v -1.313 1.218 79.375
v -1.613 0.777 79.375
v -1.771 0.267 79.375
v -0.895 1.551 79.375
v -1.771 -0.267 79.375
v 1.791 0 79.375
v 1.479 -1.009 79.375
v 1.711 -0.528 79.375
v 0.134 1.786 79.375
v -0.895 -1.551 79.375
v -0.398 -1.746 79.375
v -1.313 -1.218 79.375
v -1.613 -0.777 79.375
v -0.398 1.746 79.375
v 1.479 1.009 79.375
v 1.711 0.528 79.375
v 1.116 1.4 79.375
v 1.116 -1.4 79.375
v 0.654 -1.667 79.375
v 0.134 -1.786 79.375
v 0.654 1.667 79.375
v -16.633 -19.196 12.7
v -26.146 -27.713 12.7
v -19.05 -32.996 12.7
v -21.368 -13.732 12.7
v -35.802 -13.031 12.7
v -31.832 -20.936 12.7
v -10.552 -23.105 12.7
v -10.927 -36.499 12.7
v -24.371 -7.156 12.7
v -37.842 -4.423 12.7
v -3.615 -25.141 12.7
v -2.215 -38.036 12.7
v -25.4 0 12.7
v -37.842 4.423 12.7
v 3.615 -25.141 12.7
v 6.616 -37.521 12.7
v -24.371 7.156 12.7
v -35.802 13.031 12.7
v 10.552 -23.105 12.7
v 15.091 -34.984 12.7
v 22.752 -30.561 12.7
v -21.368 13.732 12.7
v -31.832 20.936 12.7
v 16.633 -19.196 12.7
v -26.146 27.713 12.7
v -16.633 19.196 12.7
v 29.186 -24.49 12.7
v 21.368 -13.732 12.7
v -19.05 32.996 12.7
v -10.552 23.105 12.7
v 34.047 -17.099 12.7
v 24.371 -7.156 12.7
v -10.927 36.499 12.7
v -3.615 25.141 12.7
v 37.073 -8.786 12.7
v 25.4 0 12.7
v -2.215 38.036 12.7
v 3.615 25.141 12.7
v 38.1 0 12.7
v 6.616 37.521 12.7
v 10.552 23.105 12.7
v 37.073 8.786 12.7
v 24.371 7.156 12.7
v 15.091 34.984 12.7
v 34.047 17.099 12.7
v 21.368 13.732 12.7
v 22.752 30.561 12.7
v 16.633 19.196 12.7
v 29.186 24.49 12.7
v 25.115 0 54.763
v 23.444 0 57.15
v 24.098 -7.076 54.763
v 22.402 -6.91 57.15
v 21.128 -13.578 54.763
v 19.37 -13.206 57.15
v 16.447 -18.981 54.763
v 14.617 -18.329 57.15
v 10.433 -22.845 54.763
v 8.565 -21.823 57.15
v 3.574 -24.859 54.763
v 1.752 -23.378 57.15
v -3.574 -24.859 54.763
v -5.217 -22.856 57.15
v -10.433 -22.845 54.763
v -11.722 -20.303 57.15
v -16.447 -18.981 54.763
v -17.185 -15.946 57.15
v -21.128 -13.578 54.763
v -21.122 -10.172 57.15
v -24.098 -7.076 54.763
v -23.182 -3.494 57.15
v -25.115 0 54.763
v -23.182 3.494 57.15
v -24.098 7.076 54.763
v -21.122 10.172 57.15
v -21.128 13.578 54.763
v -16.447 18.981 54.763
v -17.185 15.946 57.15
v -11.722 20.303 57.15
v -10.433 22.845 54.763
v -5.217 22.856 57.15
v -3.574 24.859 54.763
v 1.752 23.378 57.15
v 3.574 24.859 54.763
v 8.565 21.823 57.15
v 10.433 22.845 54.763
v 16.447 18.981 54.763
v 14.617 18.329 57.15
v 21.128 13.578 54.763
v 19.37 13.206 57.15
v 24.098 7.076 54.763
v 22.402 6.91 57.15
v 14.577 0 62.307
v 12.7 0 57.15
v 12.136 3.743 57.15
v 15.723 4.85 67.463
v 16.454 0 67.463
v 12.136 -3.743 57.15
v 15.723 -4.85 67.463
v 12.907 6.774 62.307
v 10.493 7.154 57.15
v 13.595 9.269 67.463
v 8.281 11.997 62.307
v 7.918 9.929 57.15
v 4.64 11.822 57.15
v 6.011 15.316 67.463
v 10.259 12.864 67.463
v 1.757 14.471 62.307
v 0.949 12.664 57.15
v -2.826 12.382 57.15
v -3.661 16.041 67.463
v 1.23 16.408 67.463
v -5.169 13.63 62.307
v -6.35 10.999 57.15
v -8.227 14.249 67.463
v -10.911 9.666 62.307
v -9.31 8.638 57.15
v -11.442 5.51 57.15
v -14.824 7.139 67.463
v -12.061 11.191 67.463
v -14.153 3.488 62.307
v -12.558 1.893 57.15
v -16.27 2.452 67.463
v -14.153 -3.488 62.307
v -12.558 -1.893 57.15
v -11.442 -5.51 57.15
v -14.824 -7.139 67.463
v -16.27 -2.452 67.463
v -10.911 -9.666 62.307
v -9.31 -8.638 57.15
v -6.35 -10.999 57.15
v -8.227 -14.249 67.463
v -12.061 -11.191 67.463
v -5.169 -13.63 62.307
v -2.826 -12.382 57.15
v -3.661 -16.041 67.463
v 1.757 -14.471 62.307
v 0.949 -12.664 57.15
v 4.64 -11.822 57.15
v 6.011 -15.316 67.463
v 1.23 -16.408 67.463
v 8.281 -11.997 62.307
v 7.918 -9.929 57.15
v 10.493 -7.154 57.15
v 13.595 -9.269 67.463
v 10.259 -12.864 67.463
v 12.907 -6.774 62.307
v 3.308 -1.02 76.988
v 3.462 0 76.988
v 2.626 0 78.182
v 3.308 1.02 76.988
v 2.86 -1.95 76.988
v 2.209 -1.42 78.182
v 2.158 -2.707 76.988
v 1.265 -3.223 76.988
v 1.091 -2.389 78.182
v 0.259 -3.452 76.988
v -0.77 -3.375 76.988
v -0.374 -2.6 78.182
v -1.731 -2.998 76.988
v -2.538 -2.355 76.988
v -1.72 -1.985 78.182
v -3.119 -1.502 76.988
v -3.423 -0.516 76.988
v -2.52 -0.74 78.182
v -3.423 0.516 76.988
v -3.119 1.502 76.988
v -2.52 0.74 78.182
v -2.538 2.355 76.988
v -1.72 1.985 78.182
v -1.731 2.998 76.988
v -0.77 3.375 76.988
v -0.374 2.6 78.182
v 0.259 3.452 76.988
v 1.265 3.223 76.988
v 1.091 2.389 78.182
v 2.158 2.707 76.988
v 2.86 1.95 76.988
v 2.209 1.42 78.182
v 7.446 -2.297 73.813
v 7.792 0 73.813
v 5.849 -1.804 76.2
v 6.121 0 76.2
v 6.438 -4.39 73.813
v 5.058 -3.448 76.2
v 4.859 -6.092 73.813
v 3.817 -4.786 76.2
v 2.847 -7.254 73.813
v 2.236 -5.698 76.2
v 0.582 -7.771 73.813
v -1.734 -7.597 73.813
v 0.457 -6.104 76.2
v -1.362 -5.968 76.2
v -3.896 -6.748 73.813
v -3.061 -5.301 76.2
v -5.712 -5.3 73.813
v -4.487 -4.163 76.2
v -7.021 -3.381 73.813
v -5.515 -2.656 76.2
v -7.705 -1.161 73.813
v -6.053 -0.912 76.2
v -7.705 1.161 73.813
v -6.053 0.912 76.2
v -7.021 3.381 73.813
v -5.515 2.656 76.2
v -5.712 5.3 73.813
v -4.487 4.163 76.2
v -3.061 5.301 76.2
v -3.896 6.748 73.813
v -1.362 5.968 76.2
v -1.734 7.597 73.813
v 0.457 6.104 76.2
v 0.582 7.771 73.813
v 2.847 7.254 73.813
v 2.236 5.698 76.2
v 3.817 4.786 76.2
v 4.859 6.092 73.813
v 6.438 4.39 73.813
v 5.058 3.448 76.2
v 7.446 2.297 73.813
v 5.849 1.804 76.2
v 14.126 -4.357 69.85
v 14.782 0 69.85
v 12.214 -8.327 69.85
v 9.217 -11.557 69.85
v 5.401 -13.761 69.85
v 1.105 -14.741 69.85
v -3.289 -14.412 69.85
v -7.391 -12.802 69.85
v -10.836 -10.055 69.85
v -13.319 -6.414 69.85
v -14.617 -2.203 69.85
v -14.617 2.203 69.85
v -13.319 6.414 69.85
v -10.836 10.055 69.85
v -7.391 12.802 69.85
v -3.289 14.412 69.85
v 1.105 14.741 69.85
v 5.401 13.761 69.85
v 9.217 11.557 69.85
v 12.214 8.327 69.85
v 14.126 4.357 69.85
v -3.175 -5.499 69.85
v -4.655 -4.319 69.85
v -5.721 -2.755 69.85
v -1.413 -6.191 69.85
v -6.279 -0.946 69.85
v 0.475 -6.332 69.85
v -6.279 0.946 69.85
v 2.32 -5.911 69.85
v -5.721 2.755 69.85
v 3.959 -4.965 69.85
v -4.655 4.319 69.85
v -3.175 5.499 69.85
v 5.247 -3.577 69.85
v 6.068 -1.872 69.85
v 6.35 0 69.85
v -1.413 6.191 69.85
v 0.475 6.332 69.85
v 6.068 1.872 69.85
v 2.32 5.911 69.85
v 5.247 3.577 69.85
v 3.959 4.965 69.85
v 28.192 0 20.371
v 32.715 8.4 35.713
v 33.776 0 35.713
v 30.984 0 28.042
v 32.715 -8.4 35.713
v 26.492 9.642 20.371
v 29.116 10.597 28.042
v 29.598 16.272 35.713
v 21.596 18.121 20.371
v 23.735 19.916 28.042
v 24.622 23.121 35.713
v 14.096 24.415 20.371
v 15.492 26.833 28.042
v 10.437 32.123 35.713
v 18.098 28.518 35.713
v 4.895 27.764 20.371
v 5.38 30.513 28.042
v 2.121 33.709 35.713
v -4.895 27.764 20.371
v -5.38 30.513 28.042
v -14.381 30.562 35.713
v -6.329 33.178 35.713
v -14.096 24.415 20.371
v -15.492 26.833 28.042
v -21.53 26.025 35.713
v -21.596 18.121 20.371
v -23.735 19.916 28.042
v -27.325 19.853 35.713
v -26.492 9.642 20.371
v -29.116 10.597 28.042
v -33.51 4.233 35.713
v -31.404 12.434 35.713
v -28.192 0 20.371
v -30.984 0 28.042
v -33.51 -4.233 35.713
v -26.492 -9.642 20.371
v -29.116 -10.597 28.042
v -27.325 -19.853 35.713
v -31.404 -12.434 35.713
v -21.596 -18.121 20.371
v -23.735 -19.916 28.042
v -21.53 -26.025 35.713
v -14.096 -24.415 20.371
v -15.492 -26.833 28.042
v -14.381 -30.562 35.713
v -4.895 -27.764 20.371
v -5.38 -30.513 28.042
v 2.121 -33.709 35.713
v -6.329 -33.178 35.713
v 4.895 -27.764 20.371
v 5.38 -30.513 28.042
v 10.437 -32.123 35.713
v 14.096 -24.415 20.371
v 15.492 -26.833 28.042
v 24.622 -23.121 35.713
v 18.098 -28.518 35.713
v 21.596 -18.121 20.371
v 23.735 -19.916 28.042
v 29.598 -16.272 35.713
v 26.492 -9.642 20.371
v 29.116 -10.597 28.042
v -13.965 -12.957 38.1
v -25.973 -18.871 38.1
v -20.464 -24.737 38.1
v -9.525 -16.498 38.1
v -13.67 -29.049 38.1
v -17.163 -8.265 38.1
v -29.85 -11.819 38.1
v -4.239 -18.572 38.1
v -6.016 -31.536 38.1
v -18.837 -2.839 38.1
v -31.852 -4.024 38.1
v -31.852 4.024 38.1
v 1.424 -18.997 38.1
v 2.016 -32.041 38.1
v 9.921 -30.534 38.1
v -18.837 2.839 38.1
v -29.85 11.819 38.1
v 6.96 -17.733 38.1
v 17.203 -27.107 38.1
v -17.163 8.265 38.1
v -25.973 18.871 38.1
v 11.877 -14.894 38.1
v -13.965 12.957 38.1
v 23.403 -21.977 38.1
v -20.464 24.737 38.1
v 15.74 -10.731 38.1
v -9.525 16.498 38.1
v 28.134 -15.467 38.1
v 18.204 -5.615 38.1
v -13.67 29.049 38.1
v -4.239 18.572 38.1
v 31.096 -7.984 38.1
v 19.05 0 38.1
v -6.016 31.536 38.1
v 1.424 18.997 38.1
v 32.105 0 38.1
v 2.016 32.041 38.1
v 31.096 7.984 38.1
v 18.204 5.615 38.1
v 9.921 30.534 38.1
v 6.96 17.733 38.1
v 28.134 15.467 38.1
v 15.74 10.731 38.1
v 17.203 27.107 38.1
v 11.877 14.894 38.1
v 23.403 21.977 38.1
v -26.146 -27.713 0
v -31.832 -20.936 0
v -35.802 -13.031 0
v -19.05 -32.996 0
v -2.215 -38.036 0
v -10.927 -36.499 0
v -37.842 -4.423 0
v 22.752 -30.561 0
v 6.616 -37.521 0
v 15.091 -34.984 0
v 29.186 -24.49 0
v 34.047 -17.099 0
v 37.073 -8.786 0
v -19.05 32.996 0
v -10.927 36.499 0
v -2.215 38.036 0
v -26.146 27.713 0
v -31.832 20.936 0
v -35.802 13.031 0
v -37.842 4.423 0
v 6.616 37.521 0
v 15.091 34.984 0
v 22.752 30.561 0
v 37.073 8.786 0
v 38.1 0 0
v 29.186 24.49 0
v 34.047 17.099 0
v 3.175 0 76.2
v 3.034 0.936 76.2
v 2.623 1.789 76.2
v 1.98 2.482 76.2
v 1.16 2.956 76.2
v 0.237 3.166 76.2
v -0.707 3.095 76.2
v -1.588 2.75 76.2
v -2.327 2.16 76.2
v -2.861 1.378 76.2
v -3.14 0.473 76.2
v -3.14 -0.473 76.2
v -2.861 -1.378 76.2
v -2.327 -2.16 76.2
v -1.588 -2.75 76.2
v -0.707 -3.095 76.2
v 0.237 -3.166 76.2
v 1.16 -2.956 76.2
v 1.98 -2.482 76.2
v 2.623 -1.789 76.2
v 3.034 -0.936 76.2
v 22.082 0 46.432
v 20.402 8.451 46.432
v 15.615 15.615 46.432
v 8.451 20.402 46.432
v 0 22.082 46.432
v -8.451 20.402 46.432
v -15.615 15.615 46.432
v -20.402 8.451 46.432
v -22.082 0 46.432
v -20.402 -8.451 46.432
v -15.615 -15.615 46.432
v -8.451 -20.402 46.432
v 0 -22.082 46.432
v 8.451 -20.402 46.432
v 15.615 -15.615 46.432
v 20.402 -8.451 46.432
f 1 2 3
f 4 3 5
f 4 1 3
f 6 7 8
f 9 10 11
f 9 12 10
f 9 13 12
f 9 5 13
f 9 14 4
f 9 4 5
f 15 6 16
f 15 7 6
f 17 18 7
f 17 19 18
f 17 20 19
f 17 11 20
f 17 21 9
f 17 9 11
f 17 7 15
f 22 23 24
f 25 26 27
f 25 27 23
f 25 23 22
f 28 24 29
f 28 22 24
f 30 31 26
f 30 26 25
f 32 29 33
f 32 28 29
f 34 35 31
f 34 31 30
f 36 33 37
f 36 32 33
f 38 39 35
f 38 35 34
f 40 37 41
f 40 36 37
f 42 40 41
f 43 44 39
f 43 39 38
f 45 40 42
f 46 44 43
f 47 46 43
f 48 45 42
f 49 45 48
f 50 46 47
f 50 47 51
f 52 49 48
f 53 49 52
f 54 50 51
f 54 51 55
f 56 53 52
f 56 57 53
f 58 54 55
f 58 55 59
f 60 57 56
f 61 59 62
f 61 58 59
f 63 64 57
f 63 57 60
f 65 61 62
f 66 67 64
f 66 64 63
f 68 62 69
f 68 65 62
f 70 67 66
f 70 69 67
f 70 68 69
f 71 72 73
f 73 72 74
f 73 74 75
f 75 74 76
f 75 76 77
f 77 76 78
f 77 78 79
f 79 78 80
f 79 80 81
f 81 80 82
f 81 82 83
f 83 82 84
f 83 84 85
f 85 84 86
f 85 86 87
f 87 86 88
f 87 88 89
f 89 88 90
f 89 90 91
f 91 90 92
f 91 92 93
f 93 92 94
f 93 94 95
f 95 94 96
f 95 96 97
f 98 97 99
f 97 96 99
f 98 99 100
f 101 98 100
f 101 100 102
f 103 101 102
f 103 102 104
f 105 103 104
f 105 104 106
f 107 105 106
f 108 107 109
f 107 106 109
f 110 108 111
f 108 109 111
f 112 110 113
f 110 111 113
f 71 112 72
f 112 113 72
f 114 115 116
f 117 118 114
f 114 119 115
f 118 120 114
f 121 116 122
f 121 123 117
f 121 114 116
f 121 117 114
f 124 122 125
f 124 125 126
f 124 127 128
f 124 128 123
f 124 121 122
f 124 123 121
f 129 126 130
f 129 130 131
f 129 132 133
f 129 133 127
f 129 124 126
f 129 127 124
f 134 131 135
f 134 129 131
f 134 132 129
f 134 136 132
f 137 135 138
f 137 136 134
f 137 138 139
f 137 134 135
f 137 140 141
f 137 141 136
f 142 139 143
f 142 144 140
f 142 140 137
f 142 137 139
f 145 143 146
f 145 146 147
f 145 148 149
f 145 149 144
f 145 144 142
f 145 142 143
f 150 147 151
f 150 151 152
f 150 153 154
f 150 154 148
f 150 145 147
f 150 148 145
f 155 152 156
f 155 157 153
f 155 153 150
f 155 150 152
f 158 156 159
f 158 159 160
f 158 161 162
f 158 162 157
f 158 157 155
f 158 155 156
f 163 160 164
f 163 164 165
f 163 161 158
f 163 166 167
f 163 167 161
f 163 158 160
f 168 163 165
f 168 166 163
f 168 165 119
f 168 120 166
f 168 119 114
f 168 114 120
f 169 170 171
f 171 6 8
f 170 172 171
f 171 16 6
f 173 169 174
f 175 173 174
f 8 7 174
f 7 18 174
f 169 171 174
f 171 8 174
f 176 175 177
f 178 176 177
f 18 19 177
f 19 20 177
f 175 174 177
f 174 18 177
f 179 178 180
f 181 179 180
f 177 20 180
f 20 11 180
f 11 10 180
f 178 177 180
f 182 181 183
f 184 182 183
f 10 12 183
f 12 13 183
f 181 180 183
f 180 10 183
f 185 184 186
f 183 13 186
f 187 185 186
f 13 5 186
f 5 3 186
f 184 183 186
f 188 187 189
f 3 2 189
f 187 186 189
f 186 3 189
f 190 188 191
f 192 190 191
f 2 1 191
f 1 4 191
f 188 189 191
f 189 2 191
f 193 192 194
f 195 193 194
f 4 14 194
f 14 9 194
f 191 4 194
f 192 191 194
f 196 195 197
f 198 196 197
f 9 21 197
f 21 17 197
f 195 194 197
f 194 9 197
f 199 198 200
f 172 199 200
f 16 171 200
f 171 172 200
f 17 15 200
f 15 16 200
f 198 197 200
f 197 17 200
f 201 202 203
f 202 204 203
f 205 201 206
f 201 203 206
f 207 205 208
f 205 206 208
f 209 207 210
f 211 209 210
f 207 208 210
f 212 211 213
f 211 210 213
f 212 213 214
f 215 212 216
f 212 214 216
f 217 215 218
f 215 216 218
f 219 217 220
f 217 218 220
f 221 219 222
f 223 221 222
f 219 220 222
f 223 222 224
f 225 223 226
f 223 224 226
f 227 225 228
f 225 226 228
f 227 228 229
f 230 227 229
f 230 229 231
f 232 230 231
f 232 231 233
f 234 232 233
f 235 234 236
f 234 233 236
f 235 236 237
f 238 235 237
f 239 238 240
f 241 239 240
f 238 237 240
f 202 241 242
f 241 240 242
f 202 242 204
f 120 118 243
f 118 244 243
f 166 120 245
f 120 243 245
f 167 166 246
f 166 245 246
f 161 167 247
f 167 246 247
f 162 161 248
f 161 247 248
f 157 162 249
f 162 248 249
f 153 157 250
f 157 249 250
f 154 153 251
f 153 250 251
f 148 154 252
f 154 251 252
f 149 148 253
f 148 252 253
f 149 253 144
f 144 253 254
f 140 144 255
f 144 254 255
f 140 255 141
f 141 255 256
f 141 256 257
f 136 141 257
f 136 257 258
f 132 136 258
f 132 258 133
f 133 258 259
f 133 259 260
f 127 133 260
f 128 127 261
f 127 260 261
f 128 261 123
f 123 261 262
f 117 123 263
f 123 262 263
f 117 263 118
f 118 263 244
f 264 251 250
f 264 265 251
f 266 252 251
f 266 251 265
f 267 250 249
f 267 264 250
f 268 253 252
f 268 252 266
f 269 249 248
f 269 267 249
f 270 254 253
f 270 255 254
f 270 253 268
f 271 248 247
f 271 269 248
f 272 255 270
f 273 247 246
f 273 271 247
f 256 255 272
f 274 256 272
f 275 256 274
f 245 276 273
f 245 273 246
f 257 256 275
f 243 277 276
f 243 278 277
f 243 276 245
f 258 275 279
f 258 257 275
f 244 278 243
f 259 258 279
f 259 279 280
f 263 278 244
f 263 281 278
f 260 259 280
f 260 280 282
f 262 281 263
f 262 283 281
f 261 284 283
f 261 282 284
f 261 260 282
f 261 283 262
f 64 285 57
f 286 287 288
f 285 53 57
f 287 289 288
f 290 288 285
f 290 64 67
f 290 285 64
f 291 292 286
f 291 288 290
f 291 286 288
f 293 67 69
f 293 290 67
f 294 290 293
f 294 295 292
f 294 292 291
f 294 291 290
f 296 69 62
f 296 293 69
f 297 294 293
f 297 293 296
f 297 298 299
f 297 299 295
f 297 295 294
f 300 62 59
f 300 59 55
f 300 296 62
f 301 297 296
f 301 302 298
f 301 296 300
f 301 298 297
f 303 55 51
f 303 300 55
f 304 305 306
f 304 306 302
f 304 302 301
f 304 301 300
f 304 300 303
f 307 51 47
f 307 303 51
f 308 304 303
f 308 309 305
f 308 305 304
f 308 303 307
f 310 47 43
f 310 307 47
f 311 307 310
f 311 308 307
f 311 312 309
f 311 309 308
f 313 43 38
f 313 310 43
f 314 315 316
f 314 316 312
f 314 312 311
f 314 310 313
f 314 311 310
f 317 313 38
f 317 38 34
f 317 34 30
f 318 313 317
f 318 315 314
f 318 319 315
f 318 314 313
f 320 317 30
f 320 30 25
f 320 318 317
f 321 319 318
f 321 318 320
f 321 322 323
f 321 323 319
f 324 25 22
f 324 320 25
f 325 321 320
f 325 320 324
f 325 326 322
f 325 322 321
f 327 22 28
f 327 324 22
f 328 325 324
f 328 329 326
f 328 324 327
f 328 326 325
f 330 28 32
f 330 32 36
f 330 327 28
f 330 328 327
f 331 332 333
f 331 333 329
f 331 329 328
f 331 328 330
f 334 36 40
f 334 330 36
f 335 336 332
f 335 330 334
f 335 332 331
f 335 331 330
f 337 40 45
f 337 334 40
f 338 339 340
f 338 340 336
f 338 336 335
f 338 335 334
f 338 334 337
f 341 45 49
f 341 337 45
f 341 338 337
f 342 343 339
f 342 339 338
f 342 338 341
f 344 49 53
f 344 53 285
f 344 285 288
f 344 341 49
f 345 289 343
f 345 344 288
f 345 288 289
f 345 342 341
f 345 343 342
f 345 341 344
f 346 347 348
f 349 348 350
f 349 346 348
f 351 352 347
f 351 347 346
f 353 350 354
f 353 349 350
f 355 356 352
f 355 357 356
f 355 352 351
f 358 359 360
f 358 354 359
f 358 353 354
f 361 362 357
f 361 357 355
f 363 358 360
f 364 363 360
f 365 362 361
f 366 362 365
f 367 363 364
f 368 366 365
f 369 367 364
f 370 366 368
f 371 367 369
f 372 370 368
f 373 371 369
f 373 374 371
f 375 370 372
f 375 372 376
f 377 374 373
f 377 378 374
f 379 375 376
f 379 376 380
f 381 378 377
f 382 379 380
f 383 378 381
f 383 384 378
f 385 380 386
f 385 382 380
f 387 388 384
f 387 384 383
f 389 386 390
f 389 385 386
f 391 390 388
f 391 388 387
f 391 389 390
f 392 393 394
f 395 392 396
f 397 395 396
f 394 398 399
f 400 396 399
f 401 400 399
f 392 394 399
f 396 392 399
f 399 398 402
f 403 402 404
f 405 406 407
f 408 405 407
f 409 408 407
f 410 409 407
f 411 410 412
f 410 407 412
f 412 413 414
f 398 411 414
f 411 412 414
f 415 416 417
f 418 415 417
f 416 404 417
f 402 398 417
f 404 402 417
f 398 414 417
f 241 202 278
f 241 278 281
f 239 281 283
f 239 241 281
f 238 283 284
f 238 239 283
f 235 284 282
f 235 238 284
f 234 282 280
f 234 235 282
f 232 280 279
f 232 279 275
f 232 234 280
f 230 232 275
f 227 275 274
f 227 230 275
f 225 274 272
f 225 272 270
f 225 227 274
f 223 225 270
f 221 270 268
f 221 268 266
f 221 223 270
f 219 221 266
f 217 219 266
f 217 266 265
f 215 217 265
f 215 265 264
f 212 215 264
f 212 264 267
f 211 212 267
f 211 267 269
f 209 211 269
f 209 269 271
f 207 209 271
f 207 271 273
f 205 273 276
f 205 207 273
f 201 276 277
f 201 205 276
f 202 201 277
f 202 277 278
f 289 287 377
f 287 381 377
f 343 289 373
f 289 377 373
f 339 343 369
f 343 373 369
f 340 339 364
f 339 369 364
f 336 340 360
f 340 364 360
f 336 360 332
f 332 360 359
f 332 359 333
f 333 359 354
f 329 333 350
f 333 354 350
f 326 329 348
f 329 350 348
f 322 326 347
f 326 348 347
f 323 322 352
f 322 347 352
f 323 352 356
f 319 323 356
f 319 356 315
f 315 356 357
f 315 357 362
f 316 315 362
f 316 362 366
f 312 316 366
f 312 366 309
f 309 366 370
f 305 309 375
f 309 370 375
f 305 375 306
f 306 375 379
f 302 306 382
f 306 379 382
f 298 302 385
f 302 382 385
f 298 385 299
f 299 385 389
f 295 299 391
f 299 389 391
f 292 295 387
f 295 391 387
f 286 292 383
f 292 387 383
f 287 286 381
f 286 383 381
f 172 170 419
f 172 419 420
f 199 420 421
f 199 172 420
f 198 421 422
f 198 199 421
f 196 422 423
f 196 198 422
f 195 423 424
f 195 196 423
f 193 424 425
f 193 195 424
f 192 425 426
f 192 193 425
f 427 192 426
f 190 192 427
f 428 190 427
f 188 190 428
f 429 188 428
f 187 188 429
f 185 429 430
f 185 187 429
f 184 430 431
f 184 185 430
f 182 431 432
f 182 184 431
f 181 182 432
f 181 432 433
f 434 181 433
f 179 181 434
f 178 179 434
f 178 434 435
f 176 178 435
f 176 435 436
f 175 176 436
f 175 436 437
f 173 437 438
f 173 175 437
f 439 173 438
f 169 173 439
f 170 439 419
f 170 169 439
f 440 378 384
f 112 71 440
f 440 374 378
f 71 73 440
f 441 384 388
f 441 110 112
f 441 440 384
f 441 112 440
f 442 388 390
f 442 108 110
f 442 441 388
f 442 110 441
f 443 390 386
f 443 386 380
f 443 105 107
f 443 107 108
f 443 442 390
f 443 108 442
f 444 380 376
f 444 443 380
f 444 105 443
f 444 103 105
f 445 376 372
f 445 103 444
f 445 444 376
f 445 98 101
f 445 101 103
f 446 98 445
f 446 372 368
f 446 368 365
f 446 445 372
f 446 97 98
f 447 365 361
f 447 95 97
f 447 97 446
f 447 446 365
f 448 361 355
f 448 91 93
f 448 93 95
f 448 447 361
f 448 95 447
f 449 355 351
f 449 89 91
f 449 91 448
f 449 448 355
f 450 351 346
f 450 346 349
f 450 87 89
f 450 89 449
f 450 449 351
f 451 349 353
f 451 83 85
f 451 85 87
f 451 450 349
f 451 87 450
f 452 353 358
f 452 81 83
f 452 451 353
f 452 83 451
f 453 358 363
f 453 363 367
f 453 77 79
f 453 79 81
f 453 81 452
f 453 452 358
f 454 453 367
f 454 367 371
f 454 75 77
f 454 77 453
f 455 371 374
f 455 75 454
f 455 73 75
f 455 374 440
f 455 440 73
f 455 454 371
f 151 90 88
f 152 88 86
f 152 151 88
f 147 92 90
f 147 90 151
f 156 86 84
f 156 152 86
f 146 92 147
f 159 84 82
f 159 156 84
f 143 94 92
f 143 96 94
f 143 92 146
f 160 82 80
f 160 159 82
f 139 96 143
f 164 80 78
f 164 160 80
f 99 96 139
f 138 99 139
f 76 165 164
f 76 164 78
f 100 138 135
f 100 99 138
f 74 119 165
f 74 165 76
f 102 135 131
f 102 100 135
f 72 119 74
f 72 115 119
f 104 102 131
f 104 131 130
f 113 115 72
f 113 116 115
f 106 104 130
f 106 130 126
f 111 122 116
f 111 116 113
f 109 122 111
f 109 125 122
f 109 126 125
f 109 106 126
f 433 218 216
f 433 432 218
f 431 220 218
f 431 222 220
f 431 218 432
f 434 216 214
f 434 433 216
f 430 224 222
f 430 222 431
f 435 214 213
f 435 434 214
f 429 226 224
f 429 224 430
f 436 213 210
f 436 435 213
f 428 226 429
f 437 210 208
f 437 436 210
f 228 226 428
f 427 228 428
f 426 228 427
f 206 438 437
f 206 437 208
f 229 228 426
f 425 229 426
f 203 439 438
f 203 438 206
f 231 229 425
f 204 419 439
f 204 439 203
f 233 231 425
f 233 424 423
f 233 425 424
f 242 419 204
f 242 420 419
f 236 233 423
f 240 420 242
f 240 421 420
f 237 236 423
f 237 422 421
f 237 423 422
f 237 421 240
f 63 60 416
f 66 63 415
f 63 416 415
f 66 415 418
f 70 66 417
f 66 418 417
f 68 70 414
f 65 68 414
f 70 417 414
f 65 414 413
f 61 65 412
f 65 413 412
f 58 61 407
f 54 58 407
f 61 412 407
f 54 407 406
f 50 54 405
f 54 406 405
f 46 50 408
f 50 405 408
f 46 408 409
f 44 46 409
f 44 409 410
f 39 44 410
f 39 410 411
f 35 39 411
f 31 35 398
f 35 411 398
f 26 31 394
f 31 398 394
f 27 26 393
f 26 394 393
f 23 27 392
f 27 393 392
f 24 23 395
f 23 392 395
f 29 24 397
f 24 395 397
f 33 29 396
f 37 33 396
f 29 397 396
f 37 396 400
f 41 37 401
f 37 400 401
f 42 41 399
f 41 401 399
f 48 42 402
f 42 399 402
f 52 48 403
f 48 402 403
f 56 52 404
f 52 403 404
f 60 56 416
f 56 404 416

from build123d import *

# Parameters (mm, degrees)
F0_R      = 38.1
F1_DEPTH  = 12.7
F2_R      = 25.4
F3_DEPTH  = 25.4
F3_TAPER  = -20
F4_R      = 19.05
F5_DEPTH  = 19.05
F5_TAPER  = -20
F6_R      = 12.7
F7_DEPTH  = 12.7
F7_TAPER  = -20
F8_R      = 6.35
F9_DEPTH  = 6.35
F9_TAPER  = -20
F10_R     = 3.175
F11_DEPTH = 3.175
F11_TAPER = -20


# Not quite as in the source:
# - a fillet or chamfer that OpenCascade refuses, or shapes differently, is made with other operations: its cross-section is extruded or revolved along the edge and cut away or added


with BuildPart() as f1:
    # F0 (on Top) → F1 (new body)
    with BuildSketch(Plane.XY):
        Circle(F0_R)
    extrude(amount=F1_DEPTH)

    # F2 (on face) → F3 (join)
    with BuildSketch(Plane.XY.offset(12.7)):
        Circle(F2_R)
    extrude(amount=F3_DEPTH, taper=F3_TAPER)

    # F4 (on face) → F5 (join)
    with BuildSketch(Plane.XY.offset(38.1)):
        Circle(F4_R)
    extrude(amount=F5_DEPTH, taper=F5_TAPER)

    # F6 (on face) → F7 (join)
    with BuildSketch(Plane.XY.offset(57.15)):
        Circle(F6_R)
    extrude(amount=F7_DEPTH, taper=F7_TAPER)

    # F8 (on face) → F9 (join)
    with BuildSketch(Plane.XY.offset(69.85)):
        Circle(F8_R)
    extrude(amount=F9_DEPTH, taper=F9_TAPER)

    # F10 (on face) → F11 (join)
    with BuildSketch(Plane.XY.offset(76.2)):
        Circle(F10_R)
    extrude(amount=F11_DEPTH, taper=F11_TAPER)

    # F12: chamfer of 2.54 on 5 edges, made by hand

    # F12_s1 → F12_t2 (revolve, cut)
    with BuildSketch(Plane.XZ):
        Polygon((33.7761127863, 35.7131807432), (32.1048439504, 38.1), (34.6448439504, 38.1), align=None)
    revolve(axis=Axis((0, 0, 38.1), (0, 0, -1)), mode=Mode.SUBTRACT)

    # F12_s3 → F12_t4 (revolve, cut)
    with BuildSketch(Plane.XZ):
        Polygon((25.1149017987, 54.7631807432), (23.4436329628, 57.15), (25.9836329628, 57.15), align=None)
    revolve(axis=Axis((0, 0, 57.15), (0, 0, -1)), mode=Mode.SUBTRACT)

    # F12_s5 → F12_t6 (revolve, cut)
    with BuildSketch(Plane.XZ):
        Polygon((16.4536908111, 67.4631807432), (14.7824219752, 69.85), (17.3224219752, 69.85), align=None)
    revolve(axis=Axis((0, 0, 69.85), (0, 0, -1)), mode=Mode.SUBTRACT)

    # F12_s7 → F12_t8 (revolve, cut)
    with BuildSketch(Plane.XZ):
        Polygon((7.7924798235, 73.8131807432), (6.1212109876, 76.2), (8.6612109876, 76.2), align=None)
    revolve(axis=Axis((0, 0, 76.2), (0, 0, -1)), mode=Mode.SUBTRACT)

    # F12_s9 → F12_t10 (revolve, cut)
    with BuildSketch(Plane.XZ):
        Polygon((3.4618743297, 76.9881807432), (1.7906054938, 79.375), (4.3306054938, 79.375), align=None)
    revolve(axis=Axis((0, 0, 79.375), (0, 0, -1)), mode=Mode.SUBTRACT)


solid = f1.part
